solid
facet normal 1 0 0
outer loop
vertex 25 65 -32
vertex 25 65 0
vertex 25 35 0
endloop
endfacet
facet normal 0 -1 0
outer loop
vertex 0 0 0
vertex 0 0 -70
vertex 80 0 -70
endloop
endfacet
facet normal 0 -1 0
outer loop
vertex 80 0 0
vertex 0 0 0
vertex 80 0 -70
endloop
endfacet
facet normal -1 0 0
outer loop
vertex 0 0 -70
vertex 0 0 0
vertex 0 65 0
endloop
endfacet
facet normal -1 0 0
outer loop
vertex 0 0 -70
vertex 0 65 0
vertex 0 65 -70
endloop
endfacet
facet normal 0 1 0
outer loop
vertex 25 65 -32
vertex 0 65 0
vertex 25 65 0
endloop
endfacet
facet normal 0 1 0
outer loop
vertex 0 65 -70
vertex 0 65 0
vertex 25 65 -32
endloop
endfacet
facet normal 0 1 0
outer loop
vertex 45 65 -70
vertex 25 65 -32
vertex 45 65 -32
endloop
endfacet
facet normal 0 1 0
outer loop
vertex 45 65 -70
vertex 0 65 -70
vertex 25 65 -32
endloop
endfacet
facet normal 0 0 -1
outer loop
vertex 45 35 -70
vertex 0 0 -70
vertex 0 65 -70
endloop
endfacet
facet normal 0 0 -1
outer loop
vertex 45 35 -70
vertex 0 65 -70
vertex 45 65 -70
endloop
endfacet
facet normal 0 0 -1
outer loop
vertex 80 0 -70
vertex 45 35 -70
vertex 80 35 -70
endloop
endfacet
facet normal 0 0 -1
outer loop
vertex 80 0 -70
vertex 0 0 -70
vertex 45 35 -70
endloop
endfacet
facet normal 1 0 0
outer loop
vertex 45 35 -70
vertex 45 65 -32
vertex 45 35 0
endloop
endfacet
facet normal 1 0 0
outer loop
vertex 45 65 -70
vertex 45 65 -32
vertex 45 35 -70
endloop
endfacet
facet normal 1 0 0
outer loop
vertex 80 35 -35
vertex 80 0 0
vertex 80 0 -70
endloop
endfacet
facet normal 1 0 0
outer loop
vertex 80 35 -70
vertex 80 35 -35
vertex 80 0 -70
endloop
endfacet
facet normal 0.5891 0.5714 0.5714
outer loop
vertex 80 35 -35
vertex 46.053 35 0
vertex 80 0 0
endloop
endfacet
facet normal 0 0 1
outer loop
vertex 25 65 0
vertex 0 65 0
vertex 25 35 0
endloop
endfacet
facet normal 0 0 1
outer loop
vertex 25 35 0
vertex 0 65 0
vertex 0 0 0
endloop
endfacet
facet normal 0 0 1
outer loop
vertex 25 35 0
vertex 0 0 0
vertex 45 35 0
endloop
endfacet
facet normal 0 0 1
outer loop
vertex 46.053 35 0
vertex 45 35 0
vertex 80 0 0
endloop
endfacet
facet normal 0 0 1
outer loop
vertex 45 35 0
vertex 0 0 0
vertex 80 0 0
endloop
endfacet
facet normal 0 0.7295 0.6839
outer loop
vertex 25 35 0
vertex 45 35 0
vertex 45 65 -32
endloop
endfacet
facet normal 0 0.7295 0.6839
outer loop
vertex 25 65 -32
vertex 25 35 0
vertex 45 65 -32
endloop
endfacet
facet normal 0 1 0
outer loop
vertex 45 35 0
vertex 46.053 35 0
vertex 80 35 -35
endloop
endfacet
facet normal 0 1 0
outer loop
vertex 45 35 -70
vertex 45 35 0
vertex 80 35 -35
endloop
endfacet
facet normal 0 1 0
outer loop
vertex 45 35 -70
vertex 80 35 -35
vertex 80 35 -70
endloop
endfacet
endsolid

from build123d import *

# Parameters (mm, degrees)
CROQUIS1_W              = 80
CROQUIS1_H              = 70
SALIENTE_EXTRUIR1_DEPTH = 65
CROQUIS2_W              = 70
CROQUIS2_H              = 30
CORTAR_EXTRUIR1_DEPTH   = 35
CORTAR_EXTRUIR2_DEPTH   = 20
CORTAR_EXTRUIR3_DEPTH   = 20


with BuildPart() as part:
    # Croquis1 → Saliente-Extruir1 (new body)
    with BuildSketch(Plane(origin=(0, 0, 0), x_dir=(1, 0, 0), z_dir=(0, 1, 0))):
        with Locations((40, 35)):
            Rectangle(CROQUIS1_W, CROQUIS1_H)
    extrude(amount=SALIENTE_EXTRUIR1_DEPTH)

    # Croquis2 → Cortar-Extruir1 (cut)
    with BuildSketch(Plane(origin=(80, 0, 0), x_dir=(0, 0, -1), z_dir=(1, 0, 0))):
        with Locations((35, 50)):
            Rectangle(CROQUIS2_W, CROQUIS2_H)
    extrude(amount=-CORTAR_EXTRUIR1_DEPTH, mode=Mode.SUBTRACT)

    # Croquis3 → Cortar-Extruir2 (cut)
    with BuildSketch(Plane(origin=(45, 0, 0), x_dir=(0, 0, -1), z_dir=(1, 0, 0))):
        Polygon((0, 35), (32, 65), (0, 65), align=None)
    extrude(amount=-CORTAR_EXTRUIR2_DEPTH, mode=Mode.SUBTRACT)

    # Croquis6 → Cortar-Extruir3 (cut)
    with BuildSketch(Plane(origin=(27.763221793, 26.928249656, 26.928249656), x_dir=(0.4101501227910038, 0.39781495770089986, -0.8206827256644043), z_dir=(0.5891012412208205, 0.5713841648103704, 0.5713841648103701))):
        Polygon((32.812009823, -55.698422491), (75.459428741, -30.574775071), (32.812009823, -6.939578699), align=None)
    extrude(amount=CORTAR_EXTRUIR3_DEPTH, mode=Mode.SUBTRACT)


solid = part.part
